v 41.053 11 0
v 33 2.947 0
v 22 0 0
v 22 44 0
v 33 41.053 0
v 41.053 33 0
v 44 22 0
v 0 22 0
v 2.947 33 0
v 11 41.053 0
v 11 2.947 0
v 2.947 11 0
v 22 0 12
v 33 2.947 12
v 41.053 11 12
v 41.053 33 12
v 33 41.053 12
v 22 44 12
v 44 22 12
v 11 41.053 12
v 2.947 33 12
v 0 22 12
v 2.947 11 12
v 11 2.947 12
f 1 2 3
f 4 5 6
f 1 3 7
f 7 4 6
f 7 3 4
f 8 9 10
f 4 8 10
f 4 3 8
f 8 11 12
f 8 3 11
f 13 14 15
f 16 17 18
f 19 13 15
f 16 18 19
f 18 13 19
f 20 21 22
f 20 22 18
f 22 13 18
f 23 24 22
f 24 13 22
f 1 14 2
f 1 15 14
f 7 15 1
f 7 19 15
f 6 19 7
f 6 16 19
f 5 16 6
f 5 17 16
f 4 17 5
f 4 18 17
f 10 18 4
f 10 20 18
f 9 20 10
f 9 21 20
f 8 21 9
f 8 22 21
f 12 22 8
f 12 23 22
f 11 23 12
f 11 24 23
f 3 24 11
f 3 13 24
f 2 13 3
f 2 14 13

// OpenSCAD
$fn = 32;

// ----------------------------------------------------------------------
// Eccentric disc: egg, 12 mm thick
// ----------------------------------------------------------------------

// --- parameters (mm) ---
profile_height = 12;      // extrusion height
profile_points = 12;      // points of the closed outline

profile = [[0, 22], [2.947, 11], [11, 2.947], [22, 0], [33, 2.947], [41.053, 11], [44, 22], [41.053, 33], [33, 41.053], [22, 44], [11, 41.053], [2.947, 33]];  // single closed polygon, 12 points, counter clockwise

// --- the one profile operation ---
linear_extrude(height = profile_height) polygon(points = profile);
